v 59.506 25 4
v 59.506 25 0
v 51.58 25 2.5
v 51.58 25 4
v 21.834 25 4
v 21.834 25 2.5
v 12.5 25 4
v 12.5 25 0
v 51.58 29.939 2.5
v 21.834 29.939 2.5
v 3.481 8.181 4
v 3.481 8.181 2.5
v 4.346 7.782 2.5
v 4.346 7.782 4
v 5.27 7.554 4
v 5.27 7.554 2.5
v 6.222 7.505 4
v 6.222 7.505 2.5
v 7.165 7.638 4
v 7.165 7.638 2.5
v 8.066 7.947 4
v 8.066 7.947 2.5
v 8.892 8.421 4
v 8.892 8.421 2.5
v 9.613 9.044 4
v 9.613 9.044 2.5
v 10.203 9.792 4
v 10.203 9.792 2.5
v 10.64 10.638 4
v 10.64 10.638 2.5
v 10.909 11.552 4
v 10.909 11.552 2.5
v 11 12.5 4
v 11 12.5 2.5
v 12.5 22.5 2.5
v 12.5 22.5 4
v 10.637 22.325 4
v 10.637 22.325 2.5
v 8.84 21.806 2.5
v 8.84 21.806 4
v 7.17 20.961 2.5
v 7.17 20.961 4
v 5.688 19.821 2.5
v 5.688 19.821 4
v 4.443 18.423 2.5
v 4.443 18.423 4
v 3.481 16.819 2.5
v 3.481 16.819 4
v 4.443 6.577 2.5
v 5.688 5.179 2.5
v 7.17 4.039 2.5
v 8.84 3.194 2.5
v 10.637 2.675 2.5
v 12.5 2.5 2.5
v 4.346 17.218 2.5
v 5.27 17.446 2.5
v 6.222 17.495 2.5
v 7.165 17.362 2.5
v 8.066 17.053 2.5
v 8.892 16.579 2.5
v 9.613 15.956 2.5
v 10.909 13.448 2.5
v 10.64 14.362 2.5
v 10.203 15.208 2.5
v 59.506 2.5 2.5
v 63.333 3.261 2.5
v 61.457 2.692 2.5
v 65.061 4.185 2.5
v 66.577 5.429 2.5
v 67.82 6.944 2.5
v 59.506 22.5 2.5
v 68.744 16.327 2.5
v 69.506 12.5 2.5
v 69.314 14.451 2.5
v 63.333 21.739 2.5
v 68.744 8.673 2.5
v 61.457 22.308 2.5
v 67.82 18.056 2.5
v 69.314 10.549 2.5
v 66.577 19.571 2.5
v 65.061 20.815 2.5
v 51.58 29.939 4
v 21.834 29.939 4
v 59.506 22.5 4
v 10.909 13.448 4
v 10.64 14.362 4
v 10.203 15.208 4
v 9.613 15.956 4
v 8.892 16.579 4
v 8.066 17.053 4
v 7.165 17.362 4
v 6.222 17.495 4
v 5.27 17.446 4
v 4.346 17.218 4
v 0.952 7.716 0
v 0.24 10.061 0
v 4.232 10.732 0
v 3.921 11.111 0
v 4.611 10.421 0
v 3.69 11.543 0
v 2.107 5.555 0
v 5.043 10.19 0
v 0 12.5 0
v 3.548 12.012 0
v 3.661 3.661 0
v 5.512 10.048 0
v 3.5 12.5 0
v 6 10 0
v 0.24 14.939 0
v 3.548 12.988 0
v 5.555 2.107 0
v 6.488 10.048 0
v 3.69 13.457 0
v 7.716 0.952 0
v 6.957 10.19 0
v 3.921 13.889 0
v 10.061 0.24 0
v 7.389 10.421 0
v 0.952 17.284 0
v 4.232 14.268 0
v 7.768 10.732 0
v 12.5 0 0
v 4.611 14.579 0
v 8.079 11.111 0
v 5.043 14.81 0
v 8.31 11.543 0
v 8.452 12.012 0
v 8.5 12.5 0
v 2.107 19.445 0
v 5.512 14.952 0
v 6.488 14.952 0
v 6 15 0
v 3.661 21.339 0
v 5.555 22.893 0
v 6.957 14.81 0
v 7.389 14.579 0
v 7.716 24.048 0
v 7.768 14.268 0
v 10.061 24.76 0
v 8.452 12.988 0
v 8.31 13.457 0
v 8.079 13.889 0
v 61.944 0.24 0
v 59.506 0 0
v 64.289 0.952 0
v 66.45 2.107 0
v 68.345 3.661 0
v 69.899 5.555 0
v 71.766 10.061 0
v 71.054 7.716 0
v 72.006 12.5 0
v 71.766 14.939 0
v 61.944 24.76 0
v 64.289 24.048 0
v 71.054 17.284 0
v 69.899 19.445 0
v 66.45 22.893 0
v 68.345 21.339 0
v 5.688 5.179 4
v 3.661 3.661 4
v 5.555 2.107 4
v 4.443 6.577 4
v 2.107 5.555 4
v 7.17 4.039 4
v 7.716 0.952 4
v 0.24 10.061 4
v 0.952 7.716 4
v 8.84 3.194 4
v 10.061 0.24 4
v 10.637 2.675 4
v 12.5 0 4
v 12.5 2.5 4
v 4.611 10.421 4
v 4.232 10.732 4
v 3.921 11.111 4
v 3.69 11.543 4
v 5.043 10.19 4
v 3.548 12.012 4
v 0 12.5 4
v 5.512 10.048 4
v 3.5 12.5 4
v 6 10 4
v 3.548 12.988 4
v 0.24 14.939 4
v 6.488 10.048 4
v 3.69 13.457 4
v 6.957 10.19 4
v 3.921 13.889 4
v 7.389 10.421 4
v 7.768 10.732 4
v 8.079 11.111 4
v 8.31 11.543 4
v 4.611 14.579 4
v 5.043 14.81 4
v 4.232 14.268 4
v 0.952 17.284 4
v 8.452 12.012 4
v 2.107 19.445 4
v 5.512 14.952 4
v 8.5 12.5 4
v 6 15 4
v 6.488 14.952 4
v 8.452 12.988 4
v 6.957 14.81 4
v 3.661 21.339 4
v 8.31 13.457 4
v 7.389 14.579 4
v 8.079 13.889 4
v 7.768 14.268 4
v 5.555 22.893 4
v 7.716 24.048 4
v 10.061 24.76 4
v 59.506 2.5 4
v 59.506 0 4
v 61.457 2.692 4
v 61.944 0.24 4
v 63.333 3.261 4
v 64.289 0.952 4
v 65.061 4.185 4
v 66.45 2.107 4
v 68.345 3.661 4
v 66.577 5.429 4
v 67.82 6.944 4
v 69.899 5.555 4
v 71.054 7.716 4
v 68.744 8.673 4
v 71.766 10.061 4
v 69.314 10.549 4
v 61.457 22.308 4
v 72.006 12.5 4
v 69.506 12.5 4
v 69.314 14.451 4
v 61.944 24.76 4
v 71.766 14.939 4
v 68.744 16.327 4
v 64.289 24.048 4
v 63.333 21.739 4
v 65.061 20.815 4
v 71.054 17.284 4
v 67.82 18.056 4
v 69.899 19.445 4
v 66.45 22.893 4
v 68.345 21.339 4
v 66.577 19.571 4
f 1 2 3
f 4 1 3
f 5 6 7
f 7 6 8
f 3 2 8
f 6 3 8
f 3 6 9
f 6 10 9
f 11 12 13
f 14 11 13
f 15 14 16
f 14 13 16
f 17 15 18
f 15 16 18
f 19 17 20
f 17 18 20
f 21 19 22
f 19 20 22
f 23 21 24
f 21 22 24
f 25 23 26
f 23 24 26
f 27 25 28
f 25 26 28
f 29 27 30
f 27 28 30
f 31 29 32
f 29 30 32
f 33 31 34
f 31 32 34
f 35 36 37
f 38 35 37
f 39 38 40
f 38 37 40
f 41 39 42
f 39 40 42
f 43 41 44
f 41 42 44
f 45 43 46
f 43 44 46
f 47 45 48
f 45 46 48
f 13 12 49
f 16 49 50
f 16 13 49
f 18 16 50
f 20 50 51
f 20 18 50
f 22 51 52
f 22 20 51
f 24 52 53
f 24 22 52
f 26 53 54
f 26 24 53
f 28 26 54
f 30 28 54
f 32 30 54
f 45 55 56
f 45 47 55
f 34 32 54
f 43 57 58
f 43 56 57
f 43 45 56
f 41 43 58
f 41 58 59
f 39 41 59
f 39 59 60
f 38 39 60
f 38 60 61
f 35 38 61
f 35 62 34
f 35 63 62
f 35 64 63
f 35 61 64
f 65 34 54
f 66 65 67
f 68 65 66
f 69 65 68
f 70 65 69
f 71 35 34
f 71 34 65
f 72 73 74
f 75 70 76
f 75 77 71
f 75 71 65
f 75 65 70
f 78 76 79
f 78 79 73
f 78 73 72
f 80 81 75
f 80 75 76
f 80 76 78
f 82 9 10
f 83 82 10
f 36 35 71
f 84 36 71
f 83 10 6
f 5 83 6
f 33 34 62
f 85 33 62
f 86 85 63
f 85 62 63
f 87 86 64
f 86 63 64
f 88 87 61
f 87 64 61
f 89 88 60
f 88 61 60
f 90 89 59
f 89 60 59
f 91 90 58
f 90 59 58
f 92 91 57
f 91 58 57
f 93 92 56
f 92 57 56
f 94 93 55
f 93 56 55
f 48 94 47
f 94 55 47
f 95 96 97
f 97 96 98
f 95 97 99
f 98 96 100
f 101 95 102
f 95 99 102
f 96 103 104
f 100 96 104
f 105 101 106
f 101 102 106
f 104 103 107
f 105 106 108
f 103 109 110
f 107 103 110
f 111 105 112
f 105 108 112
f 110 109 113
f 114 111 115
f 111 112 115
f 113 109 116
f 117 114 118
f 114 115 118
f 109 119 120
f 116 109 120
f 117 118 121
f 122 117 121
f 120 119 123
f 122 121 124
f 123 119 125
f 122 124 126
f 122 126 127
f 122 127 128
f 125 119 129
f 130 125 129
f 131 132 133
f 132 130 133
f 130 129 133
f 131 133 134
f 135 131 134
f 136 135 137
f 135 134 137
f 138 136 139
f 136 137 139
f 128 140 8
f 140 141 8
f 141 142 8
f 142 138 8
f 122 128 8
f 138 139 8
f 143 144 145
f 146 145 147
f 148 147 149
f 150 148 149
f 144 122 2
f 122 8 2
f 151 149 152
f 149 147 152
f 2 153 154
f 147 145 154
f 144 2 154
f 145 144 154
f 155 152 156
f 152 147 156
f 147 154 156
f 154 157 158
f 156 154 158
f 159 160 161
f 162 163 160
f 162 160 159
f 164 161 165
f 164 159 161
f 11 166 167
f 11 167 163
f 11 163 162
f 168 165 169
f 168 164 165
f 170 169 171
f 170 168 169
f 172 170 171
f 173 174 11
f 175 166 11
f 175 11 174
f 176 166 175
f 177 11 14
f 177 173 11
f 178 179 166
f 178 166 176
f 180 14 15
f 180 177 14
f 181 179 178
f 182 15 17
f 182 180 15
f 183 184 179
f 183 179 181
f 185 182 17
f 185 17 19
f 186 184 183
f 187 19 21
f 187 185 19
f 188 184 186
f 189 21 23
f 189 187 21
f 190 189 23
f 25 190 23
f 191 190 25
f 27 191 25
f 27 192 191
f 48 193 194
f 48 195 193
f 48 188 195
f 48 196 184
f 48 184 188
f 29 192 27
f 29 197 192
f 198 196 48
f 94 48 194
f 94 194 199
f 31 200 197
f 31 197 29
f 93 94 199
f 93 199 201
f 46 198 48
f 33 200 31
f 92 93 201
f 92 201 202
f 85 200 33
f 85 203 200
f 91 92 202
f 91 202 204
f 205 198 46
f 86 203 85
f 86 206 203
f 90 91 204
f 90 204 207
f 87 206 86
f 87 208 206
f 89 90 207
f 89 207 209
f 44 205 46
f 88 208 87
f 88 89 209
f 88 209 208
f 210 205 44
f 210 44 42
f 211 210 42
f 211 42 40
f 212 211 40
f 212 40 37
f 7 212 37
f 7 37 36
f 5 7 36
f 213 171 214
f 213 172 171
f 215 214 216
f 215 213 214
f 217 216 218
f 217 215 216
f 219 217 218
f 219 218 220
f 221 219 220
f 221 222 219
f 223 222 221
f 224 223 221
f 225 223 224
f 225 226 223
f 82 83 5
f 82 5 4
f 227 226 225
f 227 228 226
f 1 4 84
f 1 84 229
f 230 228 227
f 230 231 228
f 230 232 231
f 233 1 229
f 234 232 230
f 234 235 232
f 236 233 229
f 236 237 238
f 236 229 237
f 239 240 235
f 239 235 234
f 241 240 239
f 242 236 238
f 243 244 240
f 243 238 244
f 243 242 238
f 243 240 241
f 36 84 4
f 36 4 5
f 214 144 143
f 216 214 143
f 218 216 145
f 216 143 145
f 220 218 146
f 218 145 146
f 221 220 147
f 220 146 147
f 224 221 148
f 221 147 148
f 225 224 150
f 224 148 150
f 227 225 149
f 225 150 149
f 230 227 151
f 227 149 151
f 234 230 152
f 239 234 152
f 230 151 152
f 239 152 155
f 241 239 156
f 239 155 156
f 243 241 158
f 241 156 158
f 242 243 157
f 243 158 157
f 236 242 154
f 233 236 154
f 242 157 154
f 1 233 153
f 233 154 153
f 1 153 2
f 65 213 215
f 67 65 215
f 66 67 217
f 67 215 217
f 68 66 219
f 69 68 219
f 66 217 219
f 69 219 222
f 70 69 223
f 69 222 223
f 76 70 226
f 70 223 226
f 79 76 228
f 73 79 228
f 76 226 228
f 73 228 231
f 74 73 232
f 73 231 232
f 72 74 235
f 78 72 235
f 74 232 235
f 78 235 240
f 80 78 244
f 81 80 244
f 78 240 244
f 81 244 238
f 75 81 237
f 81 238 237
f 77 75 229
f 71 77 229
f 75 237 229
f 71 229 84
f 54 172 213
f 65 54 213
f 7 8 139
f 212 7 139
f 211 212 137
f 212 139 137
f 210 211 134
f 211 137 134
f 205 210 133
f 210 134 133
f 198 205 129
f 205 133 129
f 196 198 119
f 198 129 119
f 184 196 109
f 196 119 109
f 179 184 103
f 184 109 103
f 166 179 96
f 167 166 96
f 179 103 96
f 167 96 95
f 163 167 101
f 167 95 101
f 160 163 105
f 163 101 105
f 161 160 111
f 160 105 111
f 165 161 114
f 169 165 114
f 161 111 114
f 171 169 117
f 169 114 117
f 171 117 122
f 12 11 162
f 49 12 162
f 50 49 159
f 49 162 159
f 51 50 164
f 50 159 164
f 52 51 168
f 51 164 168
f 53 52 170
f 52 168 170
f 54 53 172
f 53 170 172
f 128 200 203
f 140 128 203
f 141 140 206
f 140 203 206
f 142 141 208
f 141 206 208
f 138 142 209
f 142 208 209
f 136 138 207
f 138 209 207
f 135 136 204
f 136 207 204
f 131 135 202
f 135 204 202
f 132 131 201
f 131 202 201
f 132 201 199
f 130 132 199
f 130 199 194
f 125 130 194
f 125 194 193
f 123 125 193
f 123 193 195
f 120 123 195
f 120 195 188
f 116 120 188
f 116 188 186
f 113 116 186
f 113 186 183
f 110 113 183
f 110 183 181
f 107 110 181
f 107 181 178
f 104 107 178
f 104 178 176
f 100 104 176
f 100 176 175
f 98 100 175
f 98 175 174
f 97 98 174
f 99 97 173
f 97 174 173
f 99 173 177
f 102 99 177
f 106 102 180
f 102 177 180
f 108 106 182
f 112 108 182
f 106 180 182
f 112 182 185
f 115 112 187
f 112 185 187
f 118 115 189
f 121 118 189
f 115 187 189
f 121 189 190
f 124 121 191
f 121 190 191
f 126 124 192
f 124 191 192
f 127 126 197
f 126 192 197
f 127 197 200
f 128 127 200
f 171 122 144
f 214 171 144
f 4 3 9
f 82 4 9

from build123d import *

# Parameters (mm, degrees)
F1_DEPTH = 4
F3_DEPTH = 1.5
F5_DEPTH = 1.5
F6_R     = 2.5
F7_DEPTH = 25
F9_DEPTH = 1.5


with BuildPart() as f1:
    # F0 (on Top) → F1 (new body)
    with BuildSketch(Plane.XY):
        with BuildLine():
            ThreePointArc((12.5, 25), (0, 12.5), (12.5, 0))
            Line((12.5, 0), (59.5057010651, 0))
            ThreePointArc((59.5057010651, 0), (72.0057010651, 12.5), (59.5057010651, 25))
            Line((59.5057010651, 25), (12.5, 25))
        make_face()
    extrude(amount=F1_DEPTH)

    # F2 (on face) → F3 (cut)
    with BuildSketch(Plane.XY.offset(4)):
        with BuildLine():
            Line((59.5057010651, 22.5), (12.5, 22.5))
            ThreePointArc((12.5, 22.5), (2.5, 12.5), (12.5, 2.5))
            Line((12.5, 2.5), (59.5057010651, 2.5))
            ThreePointArc((59.5057010651, 2.5), (69.5057010651, 12.5), (59.5057010651, 22.5))
        make_face()
    extrude(amount=-F3_DEPTH, mode=Mode.SUBTRACT)

    # F4 (on face) → F5 (join)
    with BuildSketch(Plane.XY.offset(2.5)):
        with BuildLine():
            ThreePointArc((3.4807692308, 8.1810329555), (8.4903660528, 8.1643250902), (11, 12.5))
            ThreePointArc((11, 12.5), (8.4903660528, 16.8356749098), (3.4807692308, 16.8189670445))
            ThreePointArc((3.4807692308, 16.8189670445), (2.5, 12.5), (3.4807692308, 8.1810329555))
        make_face()
    extrude(amount=F5_DEPTH)

    # F6 (on face) → F7 (cut)
    with BuildSketch(Plane.XY.offset(4)):
        with Locations((6, 12.5)):
            Circle(F6_R)
    extrude(amount=-F7_DEPTH, mode=Mode.SUBTRACT)

    # F8 (on face) → F9 (join)
    with BuildSketch(Plane.XY.offset(2.5)):
        with BuildLine():
            Line((51.5800477753, 23.6497587322), (51.5800477753, 29.9388212322))
            Line((51.5800477753, 29.9388212322), (21.8339540253, 29.9388212322))
            Line((21.8339540253, 29.9388212322), (21.8339540253, 24.7695503988))
            Line((21.8339540253, 24.7695503988), (23.6409601852, 22.5))
            Line((23.6409601852, 22.5), (29.7308289031, 22.5))
            add(Edge.make_bspline(
                [(28.4485373586, 23.8125191488), (29.2209345705, 23.0401219369), (29.7308289031, 22.5)],
                knots=[0, 0, 0, 0.4943342156, 0.4943342156, 0.4943342156], degree=2))
            Line((28.4485373586, 23.8125191488), (31.5409852753, 23.7148628988))
            Line((31.5409852753, 23.7148628988), (34.3665061086, 23.6497587322))
            Line((34.3665061086, 23.6497587322), (51.5800477753, 23.6497587322))
        make_face()
    extrude(amount=F9_DEPTH)


solid = f1.part
